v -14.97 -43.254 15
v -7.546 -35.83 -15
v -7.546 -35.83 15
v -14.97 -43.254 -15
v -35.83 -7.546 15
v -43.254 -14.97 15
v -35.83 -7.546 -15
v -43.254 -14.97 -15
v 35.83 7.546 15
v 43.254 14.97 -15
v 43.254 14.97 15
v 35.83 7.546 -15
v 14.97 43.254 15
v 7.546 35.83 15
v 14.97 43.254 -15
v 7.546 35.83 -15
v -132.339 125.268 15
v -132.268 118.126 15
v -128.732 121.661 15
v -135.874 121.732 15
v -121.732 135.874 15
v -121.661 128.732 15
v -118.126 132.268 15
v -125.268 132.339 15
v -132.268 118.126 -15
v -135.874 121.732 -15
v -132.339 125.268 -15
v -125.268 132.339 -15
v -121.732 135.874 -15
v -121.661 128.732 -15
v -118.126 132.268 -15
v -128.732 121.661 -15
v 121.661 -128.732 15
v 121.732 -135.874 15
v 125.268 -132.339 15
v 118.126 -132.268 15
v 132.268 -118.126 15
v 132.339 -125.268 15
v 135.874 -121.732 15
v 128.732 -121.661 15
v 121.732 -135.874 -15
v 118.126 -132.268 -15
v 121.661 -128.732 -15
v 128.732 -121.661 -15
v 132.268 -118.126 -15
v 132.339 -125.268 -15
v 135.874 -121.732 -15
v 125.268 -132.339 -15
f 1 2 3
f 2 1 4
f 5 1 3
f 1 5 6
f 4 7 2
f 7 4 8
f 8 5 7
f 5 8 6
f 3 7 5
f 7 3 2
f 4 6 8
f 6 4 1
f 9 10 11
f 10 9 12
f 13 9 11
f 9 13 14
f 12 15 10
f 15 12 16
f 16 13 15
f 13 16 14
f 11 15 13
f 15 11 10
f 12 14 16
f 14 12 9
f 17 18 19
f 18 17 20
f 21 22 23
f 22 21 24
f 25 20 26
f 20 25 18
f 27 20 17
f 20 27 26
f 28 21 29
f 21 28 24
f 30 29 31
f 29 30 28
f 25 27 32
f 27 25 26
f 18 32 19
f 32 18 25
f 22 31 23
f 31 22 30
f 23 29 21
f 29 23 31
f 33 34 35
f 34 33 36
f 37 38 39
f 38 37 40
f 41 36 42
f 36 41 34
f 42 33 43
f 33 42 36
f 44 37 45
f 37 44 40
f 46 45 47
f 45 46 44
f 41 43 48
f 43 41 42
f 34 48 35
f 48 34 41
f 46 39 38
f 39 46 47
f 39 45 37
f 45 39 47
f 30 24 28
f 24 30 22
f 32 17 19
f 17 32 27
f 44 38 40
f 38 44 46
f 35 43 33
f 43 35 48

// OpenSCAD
module irsensors()
{
	difference() 
	{
		union() 
		color("black")
		{
	        translate([-25.4,-25.4,0])
			rotate(315) cube(size=[40, 10.5, 30], center = true, $fs=.01); //IR sensor takeup side
	        translate([25.4, 25.4,0])
			rotate(315) cube(size=[40, 10.5, 30], center = true, $fs=.01); //IR sensor supply side
	        translate([-127, 127,0])
			rotate(45) cube(size=[20, 5.1, 30], center = true, $fs=.01); //photoop sensor takeup side
	        translate([127, -127,0])
			rotate(45) cube(size=[20, 5.1, 30], center = true, $fs=.01); //photoop sensor supply side
		}
		union()
		color("black")
		{
	        translate([-127, 127,0])
			rotate(45) cube(size=[10, 7, 40], center = true, $fs=.01); //photoop sensor takeup side
	        translate([127, -127,0])
			rotate(45) cube(size=[10, 7, 40], center = true, $fs=.01); //photoop sensor supply side
		}
	}
}

irsensors();
